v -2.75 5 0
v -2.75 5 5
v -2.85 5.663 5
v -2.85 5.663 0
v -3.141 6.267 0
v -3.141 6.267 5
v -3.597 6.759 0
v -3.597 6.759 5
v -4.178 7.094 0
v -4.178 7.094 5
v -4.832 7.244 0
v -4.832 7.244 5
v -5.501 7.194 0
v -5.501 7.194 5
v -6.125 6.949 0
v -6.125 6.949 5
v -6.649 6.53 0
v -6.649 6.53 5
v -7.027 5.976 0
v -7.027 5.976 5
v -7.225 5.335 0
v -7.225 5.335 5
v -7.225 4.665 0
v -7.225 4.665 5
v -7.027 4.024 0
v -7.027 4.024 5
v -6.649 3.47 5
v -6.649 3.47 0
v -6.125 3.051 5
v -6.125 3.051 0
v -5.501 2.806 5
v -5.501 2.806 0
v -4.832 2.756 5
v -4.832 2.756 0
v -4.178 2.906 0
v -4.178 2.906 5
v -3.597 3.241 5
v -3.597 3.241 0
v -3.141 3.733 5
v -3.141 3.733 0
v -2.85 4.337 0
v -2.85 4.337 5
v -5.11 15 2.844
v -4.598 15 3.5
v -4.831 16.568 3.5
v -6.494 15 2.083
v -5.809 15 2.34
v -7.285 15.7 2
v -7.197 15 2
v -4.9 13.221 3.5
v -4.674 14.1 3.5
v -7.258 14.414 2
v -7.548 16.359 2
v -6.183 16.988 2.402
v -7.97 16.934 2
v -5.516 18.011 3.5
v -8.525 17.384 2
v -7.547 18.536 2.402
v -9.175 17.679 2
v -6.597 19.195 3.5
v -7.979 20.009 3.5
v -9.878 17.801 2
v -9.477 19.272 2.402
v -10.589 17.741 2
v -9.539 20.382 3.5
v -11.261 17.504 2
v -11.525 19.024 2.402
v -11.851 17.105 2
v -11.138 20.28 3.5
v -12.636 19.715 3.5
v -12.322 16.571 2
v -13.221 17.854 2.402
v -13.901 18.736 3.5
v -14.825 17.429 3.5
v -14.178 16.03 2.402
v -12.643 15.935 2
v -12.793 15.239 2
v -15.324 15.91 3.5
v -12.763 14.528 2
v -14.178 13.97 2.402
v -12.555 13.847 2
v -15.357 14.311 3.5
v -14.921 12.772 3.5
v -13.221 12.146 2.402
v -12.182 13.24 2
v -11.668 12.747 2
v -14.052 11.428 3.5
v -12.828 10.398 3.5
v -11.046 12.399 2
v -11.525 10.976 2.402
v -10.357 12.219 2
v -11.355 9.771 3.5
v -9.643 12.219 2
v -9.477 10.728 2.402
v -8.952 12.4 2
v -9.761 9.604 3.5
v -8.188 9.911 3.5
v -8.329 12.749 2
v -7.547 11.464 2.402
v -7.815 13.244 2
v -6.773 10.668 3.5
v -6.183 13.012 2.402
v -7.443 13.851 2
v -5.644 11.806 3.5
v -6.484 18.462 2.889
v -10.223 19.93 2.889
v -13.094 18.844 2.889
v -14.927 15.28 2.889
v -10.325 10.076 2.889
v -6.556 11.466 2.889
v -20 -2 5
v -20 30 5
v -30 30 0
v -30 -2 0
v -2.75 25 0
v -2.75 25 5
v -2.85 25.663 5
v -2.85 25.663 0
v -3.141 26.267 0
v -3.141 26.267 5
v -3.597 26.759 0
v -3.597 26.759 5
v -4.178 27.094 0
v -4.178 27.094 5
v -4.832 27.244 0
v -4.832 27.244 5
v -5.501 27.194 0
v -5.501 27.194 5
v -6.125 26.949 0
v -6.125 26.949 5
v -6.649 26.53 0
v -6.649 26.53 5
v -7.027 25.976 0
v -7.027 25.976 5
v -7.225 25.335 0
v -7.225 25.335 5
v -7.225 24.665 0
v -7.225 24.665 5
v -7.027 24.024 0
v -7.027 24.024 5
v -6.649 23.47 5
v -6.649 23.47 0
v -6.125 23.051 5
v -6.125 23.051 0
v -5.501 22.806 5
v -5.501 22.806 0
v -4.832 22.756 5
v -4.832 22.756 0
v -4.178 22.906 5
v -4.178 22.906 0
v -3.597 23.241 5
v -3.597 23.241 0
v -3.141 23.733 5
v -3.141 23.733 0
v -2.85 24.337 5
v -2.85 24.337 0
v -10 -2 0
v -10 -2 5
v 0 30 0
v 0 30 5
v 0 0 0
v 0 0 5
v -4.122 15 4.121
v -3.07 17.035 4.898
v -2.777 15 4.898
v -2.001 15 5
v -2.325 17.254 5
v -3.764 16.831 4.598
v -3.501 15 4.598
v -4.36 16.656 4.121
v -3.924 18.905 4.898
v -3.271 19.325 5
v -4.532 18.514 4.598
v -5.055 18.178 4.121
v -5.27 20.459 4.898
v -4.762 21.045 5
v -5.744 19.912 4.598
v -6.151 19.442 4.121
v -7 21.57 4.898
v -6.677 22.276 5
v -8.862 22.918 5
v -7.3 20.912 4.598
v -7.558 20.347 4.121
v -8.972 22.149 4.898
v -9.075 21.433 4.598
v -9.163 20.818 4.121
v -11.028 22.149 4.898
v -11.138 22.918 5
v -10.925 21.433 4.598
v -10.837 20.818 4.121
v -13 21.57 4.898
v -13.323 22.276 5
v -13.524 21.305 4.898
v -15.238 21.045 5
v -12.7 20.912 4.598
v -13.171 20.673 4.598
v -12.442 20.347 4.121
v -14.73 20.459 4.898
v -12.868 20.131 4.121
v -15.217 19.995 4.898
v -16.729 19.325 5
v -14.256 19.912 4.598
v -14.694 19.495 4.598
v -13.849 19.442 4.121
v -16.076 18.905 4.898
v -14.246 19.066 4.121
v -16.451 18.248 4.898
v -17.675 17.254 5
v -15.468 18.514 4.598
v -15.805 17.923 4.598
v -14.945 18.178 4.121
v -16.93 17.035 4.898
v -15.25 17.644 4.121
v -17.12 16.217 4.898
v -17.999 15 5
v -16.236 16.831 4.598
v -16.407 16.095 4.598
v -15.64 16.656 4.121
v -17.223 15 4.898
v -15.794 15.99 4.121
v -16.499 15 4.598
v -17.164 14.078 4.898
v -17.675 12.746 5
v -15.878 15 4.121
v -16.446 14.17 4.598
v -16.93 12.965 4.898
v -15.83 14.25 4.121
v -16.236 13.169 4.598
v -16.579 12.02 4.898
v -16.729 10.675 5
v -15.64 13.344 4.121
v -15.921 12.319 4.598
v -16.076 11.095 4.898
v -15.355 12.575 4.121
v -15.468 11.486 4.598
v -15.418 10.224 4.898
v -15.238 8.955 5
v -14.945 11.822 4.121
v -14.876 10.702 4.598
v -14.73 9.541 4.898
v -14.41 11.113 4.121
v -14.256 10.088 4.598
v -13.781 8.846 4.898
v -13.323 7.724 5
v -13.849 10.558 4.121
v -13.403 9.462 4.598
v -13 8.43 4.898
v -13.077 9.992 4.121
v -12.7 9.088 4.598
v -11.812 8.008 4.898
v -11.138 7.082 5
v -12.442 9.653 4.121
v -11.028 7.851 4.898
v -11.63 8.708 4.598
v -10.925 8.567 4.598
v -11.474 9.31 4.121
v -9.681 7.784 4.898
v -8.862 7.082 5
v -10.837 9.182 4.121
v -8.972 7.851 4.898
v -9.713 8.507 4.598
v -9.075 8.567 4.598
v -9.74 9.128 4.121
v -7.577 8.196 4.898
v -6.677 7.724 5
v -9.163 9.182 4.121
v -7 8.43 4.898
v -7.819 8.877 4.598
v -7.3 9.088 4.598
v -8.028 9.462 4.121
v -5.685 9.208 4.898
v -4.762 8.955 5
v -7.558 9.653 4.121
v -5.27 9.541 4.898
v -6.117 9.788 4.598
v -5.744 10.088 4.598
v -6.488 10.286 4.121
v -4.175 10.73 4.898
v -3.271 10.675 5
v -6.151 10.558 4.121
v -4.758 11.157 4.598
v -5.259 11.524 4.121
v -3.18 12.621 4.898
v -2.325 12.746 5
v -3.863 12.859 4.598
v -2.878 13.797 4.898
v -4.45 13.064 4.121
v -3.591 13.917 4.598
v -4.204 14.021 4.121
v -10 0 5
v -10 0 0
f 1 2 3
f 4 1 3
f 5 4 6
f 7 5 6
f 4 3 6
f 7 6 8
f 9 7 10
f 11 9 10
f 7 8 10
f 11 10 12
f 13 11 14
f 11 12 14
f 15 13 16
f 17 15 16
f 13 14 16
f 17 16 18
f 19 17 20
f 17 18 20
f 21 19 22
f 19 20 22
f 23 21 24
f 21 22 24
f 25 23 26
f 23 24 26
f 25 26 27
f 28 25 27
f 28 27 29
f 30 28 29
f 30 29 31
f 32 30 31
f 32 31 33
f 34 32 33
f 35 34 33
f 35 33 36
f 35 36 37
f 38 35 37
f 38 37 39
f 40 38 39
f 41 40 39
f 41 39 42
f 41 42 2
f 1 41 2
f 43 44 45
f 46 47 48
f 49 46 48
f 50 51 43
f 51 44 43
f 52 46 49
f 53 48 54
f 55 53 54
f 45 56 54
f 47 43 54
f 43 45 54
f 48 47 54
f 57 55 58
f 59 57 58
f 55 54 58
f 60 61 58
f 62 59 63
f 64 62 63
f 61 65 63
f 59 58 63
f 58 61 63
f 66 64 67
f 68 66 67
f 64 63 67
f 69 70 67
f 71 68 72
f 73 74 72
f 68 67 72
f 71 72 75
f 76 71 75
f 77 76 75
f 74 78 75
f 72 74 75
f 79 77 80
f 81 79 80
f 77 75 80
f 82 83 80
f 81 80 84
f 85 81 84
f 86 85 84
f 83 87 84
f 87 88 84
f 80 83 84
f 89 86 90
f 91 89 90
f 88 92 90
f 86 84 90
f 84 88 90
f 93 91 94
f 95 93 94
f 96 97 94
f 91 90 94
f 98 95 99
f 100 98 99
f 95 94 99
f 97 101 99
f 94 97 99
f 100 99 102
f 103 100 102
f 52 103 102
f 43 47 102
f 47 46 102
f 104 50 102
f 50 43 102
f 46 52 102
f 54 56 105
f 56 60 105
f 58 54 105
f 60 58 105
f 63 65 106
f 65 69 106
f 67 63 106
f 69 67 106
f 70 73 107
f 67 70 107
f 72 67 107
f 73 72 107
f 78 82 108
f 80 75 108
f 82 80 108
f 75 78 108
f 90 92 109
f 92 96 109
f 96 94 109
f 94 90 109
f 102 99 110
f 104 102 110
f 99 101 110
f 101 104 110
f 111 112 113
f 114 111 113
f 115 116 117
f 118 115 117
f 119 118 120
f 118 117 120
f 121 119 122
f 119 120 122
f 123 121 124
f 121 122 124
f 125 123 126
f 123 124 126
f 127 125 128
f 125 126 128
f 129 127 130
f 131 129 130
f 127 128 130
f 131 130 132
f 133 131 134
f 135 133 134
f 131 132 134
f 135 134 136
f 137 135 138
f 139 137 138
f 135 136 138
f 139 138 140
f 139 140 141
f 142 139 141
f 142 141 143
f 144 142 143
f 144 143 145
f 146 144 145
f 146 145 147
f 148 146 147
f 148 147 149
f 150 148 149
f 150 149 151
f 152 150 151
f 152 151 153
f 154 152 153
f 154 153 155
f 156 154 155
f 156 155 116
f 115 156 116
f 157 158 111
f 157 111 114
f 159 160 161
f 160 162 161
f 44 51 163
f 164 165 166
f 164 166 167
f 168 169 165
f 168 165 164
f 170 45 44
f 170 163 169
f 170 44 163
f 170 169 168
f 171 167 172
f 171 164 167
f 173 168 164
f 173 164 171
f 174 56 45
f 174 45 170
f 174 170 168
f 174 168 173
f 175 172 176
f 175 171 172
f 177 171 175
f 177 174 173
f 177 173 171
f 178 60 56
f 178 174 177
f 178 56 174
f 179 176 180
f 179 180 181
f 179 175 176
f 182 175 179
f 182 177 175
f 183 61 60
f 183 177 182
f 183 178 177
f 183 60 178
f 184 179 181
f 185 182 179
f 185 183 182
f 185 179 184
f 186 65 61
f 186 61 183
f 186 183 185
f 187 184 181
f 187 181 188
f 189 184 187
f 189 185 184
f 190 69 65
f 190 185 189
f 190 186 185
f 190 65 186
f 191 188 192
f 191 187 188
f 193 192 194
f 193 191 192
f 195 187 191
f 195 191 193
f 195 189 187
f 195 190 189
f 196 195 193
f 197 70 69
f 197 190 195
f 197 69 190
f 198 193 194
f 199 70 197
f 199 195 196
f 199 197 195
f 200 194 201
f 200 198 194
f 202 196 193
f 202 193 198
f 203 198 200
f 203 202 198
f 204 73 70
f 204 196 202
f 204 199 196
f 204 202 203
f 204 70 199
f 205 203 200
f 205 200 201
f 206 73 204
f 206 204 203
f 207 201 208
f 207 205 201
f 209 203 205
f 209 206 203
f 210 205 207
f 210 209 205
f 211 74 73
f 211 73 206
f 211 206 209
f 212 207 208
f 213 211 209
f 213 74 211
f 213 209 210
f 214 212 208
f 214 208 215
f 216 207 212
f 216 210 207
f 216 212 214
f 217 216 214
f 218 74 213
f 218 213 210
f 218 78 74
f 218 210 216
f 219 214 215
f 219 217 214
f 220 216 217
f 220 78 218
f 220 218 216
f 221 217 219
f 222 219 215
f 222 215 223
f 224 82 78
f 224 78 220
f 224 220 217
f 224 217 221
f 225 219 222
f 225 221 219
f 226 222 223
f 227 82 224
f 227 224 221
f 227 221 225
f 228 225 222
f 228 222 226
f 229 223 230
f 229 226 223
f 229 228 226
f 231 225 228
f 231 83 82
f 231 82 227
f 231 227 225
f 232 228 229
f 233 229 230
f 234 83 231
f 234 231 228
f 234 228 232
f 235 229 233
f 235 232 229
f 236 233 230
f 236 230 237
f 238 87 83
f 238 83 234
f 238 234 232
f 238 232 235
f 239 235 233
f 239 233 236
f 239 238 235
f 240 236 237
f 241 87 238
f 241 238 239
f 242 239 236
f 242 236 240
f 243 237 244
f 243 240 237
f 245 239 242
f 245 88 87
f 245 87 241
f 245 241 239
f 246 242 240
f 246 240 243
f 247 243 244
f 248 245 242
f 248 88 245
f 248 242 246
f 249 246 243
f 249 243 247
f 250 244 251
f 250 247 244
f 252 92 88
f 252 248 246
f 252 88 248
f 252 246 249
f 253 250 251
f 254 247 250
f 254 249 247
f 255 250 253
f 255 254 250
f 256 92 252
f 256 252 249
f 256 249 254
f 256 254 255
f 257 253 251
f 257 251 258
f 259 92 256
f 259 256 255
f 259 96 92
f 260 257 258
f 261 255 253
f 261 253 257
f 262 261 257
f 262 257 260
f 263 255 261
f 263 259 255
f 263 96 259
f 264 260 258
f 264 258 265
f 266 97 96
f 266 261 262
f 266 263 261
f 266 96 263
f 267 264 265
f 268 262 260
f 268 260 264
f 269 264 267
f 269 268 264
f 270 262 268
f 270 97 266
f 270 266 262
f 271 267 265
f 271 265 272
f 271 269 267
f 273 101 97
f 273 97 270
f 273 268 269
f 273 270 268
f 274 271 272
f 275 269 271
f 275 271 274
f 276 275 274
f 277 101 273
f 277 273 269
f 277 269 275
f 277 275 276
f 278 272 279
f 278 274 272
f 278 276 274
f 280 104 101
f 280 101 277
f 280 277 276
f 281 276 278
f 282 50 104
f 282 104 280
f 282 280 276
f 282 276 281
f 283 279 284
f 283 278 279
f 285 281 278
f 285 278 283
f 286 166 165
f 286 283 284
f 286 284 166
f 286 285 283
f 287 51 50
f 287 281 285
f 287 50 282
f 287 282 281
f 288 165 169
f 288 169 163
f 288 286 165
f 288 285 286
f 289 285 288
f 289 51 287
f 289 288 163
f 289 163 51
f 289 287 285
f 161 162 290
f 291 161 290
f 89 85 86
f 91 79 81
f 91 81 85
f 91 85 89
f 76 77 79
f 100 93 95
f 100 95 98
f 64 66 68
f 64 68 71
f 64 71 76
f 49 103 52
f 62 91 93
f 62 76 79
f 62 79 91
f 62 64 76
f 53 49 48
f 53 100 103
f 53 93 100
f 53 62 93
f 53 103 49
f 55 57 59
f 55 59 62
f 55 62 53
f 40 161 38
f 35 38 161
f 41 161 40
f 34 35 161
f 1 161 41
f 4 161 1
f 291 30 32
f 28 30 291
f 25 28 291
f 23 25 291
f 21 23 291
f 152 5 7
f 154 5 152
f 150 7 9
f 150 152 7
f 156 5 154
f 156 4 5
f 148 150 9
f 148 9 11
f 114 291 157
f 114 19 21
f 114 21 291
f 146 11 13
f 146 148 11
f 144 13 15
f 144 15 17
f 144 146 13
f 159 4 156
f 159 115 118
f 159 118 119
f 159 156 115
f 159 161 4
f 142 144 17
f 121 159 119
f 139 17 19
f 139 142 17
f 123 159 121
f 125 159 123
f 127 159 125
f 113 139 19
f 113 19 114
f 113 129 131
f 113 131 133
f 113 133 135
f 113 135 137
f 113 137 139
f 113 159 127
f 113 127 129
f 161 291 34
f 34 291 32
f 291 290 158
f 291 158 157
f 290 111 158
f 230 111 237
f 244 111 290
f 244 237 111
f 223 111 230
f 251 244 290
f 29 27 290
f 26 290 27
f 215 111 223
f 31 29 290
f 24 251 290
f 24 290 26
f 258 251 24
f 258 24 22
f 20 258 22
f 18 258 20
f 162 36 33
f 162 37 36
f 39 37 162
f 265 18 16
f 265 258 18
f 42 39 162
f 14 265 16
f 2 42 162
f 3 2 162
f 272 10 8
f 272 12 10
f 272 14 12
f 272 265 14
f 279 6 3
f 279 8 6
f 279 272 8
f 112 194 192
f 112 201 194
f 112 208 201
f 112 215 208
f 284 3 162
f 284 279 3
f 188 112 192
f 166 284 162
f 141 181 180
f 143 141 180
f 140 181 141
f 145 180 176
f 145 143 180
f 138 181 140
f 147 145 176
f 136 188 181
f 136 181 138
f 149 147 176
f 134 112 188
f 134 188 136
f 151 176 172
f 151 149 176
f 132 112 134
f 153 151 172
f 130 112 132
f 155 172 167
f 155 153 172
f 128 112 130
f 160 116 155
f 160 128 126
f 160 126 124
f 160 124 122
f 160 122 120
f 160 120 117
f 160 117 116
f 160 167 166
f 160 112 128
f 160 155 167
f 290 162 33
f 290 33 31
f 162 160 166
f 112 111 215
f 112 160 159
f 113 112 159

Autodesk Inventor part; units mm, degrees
ref_plane "YZ Plane" through (0, 0, 0) normal (1, 0, 0) x (0, 1, 0)
ref_plane "XZ Plane" through (0, 0, 0) normal (0, 1, 0) x (-1, 0, 0)
sketch "Sketch1" plane through (0, 0, 0) normal (0, 1, 0) x (-1, 0, 0)
  line L0 (0, 0) -> (30, 0)
  line L1 (0, 5) -> (0, 0)
  line L2 (20, 5) -> (30, 0)
  line L3 (30, 12) -> (0, 12)
  line L4 (0, 12) -> (0, 5)
  line L5 (0, 5) -> (0, 7)
  line L6 (18, 7) -> (30, 12)
  line L7 (20, 5) -> (10, 5)
  line L8 (10, 5) -> (10, 7)
  line L9 (18, 7) -> (10, 7)
  line L10 (10, 5) -> (0, 5)
  line L11 (10, 5) -> (10, 0)
  dimension "d13" = 2
  dimension "d15" = 10
extrude "Extrusion2" add sketch "Sketch1" along normal blind 30 contours L1 L10 L11 L0 | L11 L7 L2 L0
ref_plane "Work Plane2" through (-20, -2, 5) normal (0, 0, 1) x (1, 0, 0)
sketch "Sketch2" plane through (-20, -2, 5) normal (0, 0, 1) x (1, 0, 0)
  line L0 (20, 2) -> (20, 17)
  line L1 (20, 2) -> (20, 32) projected
  line L2 (20, 17) -> (10, 17)
  circle A0 centre (10, 17) radius 5
  circle A1 centre (10, 17) radius 7.5
  line L3 (20, 32) -> (15, 32)
  line L4 (20, 32) -> (-10, 32) projected
  line L5 (15, 32) -> (15, 27)
  circle A2 centre (15, 27) radius 2.25
  line L6 (20, 17) -> (20, 7)
  line L7 (20, 2) -> (20, 32) projected
  line L8 (20, 7) -> (15, 7)
  circle A3 centre (15, 7) radius 2.25
  dimension "d20" = 10
  dimension "d21" = 10
  dimension "d22" = 15
  dimension "d30" = 5
  dimension "d31" = 5
  dimension "d32" = 4.5
  dimension "d33" = 10
  dimension "d34" = 5
  dimension "d35" = 4.5
extrude "Extrusion3" cut sketch "Sketch2" against normal blind 3 contours A0
fillet "Fillet3" radius 3 2 edges at (-15, 15, 5) (-15, 15, 2)
extrude "Extrusion4" add sketch "Sketch1" against normal blind 2 contours L11 L7 L2 L0
extrude "Extrusion5" cut sketch "Sketch2" against normal blind 20 contours A2 | A3
properties part number "clip_tip"
